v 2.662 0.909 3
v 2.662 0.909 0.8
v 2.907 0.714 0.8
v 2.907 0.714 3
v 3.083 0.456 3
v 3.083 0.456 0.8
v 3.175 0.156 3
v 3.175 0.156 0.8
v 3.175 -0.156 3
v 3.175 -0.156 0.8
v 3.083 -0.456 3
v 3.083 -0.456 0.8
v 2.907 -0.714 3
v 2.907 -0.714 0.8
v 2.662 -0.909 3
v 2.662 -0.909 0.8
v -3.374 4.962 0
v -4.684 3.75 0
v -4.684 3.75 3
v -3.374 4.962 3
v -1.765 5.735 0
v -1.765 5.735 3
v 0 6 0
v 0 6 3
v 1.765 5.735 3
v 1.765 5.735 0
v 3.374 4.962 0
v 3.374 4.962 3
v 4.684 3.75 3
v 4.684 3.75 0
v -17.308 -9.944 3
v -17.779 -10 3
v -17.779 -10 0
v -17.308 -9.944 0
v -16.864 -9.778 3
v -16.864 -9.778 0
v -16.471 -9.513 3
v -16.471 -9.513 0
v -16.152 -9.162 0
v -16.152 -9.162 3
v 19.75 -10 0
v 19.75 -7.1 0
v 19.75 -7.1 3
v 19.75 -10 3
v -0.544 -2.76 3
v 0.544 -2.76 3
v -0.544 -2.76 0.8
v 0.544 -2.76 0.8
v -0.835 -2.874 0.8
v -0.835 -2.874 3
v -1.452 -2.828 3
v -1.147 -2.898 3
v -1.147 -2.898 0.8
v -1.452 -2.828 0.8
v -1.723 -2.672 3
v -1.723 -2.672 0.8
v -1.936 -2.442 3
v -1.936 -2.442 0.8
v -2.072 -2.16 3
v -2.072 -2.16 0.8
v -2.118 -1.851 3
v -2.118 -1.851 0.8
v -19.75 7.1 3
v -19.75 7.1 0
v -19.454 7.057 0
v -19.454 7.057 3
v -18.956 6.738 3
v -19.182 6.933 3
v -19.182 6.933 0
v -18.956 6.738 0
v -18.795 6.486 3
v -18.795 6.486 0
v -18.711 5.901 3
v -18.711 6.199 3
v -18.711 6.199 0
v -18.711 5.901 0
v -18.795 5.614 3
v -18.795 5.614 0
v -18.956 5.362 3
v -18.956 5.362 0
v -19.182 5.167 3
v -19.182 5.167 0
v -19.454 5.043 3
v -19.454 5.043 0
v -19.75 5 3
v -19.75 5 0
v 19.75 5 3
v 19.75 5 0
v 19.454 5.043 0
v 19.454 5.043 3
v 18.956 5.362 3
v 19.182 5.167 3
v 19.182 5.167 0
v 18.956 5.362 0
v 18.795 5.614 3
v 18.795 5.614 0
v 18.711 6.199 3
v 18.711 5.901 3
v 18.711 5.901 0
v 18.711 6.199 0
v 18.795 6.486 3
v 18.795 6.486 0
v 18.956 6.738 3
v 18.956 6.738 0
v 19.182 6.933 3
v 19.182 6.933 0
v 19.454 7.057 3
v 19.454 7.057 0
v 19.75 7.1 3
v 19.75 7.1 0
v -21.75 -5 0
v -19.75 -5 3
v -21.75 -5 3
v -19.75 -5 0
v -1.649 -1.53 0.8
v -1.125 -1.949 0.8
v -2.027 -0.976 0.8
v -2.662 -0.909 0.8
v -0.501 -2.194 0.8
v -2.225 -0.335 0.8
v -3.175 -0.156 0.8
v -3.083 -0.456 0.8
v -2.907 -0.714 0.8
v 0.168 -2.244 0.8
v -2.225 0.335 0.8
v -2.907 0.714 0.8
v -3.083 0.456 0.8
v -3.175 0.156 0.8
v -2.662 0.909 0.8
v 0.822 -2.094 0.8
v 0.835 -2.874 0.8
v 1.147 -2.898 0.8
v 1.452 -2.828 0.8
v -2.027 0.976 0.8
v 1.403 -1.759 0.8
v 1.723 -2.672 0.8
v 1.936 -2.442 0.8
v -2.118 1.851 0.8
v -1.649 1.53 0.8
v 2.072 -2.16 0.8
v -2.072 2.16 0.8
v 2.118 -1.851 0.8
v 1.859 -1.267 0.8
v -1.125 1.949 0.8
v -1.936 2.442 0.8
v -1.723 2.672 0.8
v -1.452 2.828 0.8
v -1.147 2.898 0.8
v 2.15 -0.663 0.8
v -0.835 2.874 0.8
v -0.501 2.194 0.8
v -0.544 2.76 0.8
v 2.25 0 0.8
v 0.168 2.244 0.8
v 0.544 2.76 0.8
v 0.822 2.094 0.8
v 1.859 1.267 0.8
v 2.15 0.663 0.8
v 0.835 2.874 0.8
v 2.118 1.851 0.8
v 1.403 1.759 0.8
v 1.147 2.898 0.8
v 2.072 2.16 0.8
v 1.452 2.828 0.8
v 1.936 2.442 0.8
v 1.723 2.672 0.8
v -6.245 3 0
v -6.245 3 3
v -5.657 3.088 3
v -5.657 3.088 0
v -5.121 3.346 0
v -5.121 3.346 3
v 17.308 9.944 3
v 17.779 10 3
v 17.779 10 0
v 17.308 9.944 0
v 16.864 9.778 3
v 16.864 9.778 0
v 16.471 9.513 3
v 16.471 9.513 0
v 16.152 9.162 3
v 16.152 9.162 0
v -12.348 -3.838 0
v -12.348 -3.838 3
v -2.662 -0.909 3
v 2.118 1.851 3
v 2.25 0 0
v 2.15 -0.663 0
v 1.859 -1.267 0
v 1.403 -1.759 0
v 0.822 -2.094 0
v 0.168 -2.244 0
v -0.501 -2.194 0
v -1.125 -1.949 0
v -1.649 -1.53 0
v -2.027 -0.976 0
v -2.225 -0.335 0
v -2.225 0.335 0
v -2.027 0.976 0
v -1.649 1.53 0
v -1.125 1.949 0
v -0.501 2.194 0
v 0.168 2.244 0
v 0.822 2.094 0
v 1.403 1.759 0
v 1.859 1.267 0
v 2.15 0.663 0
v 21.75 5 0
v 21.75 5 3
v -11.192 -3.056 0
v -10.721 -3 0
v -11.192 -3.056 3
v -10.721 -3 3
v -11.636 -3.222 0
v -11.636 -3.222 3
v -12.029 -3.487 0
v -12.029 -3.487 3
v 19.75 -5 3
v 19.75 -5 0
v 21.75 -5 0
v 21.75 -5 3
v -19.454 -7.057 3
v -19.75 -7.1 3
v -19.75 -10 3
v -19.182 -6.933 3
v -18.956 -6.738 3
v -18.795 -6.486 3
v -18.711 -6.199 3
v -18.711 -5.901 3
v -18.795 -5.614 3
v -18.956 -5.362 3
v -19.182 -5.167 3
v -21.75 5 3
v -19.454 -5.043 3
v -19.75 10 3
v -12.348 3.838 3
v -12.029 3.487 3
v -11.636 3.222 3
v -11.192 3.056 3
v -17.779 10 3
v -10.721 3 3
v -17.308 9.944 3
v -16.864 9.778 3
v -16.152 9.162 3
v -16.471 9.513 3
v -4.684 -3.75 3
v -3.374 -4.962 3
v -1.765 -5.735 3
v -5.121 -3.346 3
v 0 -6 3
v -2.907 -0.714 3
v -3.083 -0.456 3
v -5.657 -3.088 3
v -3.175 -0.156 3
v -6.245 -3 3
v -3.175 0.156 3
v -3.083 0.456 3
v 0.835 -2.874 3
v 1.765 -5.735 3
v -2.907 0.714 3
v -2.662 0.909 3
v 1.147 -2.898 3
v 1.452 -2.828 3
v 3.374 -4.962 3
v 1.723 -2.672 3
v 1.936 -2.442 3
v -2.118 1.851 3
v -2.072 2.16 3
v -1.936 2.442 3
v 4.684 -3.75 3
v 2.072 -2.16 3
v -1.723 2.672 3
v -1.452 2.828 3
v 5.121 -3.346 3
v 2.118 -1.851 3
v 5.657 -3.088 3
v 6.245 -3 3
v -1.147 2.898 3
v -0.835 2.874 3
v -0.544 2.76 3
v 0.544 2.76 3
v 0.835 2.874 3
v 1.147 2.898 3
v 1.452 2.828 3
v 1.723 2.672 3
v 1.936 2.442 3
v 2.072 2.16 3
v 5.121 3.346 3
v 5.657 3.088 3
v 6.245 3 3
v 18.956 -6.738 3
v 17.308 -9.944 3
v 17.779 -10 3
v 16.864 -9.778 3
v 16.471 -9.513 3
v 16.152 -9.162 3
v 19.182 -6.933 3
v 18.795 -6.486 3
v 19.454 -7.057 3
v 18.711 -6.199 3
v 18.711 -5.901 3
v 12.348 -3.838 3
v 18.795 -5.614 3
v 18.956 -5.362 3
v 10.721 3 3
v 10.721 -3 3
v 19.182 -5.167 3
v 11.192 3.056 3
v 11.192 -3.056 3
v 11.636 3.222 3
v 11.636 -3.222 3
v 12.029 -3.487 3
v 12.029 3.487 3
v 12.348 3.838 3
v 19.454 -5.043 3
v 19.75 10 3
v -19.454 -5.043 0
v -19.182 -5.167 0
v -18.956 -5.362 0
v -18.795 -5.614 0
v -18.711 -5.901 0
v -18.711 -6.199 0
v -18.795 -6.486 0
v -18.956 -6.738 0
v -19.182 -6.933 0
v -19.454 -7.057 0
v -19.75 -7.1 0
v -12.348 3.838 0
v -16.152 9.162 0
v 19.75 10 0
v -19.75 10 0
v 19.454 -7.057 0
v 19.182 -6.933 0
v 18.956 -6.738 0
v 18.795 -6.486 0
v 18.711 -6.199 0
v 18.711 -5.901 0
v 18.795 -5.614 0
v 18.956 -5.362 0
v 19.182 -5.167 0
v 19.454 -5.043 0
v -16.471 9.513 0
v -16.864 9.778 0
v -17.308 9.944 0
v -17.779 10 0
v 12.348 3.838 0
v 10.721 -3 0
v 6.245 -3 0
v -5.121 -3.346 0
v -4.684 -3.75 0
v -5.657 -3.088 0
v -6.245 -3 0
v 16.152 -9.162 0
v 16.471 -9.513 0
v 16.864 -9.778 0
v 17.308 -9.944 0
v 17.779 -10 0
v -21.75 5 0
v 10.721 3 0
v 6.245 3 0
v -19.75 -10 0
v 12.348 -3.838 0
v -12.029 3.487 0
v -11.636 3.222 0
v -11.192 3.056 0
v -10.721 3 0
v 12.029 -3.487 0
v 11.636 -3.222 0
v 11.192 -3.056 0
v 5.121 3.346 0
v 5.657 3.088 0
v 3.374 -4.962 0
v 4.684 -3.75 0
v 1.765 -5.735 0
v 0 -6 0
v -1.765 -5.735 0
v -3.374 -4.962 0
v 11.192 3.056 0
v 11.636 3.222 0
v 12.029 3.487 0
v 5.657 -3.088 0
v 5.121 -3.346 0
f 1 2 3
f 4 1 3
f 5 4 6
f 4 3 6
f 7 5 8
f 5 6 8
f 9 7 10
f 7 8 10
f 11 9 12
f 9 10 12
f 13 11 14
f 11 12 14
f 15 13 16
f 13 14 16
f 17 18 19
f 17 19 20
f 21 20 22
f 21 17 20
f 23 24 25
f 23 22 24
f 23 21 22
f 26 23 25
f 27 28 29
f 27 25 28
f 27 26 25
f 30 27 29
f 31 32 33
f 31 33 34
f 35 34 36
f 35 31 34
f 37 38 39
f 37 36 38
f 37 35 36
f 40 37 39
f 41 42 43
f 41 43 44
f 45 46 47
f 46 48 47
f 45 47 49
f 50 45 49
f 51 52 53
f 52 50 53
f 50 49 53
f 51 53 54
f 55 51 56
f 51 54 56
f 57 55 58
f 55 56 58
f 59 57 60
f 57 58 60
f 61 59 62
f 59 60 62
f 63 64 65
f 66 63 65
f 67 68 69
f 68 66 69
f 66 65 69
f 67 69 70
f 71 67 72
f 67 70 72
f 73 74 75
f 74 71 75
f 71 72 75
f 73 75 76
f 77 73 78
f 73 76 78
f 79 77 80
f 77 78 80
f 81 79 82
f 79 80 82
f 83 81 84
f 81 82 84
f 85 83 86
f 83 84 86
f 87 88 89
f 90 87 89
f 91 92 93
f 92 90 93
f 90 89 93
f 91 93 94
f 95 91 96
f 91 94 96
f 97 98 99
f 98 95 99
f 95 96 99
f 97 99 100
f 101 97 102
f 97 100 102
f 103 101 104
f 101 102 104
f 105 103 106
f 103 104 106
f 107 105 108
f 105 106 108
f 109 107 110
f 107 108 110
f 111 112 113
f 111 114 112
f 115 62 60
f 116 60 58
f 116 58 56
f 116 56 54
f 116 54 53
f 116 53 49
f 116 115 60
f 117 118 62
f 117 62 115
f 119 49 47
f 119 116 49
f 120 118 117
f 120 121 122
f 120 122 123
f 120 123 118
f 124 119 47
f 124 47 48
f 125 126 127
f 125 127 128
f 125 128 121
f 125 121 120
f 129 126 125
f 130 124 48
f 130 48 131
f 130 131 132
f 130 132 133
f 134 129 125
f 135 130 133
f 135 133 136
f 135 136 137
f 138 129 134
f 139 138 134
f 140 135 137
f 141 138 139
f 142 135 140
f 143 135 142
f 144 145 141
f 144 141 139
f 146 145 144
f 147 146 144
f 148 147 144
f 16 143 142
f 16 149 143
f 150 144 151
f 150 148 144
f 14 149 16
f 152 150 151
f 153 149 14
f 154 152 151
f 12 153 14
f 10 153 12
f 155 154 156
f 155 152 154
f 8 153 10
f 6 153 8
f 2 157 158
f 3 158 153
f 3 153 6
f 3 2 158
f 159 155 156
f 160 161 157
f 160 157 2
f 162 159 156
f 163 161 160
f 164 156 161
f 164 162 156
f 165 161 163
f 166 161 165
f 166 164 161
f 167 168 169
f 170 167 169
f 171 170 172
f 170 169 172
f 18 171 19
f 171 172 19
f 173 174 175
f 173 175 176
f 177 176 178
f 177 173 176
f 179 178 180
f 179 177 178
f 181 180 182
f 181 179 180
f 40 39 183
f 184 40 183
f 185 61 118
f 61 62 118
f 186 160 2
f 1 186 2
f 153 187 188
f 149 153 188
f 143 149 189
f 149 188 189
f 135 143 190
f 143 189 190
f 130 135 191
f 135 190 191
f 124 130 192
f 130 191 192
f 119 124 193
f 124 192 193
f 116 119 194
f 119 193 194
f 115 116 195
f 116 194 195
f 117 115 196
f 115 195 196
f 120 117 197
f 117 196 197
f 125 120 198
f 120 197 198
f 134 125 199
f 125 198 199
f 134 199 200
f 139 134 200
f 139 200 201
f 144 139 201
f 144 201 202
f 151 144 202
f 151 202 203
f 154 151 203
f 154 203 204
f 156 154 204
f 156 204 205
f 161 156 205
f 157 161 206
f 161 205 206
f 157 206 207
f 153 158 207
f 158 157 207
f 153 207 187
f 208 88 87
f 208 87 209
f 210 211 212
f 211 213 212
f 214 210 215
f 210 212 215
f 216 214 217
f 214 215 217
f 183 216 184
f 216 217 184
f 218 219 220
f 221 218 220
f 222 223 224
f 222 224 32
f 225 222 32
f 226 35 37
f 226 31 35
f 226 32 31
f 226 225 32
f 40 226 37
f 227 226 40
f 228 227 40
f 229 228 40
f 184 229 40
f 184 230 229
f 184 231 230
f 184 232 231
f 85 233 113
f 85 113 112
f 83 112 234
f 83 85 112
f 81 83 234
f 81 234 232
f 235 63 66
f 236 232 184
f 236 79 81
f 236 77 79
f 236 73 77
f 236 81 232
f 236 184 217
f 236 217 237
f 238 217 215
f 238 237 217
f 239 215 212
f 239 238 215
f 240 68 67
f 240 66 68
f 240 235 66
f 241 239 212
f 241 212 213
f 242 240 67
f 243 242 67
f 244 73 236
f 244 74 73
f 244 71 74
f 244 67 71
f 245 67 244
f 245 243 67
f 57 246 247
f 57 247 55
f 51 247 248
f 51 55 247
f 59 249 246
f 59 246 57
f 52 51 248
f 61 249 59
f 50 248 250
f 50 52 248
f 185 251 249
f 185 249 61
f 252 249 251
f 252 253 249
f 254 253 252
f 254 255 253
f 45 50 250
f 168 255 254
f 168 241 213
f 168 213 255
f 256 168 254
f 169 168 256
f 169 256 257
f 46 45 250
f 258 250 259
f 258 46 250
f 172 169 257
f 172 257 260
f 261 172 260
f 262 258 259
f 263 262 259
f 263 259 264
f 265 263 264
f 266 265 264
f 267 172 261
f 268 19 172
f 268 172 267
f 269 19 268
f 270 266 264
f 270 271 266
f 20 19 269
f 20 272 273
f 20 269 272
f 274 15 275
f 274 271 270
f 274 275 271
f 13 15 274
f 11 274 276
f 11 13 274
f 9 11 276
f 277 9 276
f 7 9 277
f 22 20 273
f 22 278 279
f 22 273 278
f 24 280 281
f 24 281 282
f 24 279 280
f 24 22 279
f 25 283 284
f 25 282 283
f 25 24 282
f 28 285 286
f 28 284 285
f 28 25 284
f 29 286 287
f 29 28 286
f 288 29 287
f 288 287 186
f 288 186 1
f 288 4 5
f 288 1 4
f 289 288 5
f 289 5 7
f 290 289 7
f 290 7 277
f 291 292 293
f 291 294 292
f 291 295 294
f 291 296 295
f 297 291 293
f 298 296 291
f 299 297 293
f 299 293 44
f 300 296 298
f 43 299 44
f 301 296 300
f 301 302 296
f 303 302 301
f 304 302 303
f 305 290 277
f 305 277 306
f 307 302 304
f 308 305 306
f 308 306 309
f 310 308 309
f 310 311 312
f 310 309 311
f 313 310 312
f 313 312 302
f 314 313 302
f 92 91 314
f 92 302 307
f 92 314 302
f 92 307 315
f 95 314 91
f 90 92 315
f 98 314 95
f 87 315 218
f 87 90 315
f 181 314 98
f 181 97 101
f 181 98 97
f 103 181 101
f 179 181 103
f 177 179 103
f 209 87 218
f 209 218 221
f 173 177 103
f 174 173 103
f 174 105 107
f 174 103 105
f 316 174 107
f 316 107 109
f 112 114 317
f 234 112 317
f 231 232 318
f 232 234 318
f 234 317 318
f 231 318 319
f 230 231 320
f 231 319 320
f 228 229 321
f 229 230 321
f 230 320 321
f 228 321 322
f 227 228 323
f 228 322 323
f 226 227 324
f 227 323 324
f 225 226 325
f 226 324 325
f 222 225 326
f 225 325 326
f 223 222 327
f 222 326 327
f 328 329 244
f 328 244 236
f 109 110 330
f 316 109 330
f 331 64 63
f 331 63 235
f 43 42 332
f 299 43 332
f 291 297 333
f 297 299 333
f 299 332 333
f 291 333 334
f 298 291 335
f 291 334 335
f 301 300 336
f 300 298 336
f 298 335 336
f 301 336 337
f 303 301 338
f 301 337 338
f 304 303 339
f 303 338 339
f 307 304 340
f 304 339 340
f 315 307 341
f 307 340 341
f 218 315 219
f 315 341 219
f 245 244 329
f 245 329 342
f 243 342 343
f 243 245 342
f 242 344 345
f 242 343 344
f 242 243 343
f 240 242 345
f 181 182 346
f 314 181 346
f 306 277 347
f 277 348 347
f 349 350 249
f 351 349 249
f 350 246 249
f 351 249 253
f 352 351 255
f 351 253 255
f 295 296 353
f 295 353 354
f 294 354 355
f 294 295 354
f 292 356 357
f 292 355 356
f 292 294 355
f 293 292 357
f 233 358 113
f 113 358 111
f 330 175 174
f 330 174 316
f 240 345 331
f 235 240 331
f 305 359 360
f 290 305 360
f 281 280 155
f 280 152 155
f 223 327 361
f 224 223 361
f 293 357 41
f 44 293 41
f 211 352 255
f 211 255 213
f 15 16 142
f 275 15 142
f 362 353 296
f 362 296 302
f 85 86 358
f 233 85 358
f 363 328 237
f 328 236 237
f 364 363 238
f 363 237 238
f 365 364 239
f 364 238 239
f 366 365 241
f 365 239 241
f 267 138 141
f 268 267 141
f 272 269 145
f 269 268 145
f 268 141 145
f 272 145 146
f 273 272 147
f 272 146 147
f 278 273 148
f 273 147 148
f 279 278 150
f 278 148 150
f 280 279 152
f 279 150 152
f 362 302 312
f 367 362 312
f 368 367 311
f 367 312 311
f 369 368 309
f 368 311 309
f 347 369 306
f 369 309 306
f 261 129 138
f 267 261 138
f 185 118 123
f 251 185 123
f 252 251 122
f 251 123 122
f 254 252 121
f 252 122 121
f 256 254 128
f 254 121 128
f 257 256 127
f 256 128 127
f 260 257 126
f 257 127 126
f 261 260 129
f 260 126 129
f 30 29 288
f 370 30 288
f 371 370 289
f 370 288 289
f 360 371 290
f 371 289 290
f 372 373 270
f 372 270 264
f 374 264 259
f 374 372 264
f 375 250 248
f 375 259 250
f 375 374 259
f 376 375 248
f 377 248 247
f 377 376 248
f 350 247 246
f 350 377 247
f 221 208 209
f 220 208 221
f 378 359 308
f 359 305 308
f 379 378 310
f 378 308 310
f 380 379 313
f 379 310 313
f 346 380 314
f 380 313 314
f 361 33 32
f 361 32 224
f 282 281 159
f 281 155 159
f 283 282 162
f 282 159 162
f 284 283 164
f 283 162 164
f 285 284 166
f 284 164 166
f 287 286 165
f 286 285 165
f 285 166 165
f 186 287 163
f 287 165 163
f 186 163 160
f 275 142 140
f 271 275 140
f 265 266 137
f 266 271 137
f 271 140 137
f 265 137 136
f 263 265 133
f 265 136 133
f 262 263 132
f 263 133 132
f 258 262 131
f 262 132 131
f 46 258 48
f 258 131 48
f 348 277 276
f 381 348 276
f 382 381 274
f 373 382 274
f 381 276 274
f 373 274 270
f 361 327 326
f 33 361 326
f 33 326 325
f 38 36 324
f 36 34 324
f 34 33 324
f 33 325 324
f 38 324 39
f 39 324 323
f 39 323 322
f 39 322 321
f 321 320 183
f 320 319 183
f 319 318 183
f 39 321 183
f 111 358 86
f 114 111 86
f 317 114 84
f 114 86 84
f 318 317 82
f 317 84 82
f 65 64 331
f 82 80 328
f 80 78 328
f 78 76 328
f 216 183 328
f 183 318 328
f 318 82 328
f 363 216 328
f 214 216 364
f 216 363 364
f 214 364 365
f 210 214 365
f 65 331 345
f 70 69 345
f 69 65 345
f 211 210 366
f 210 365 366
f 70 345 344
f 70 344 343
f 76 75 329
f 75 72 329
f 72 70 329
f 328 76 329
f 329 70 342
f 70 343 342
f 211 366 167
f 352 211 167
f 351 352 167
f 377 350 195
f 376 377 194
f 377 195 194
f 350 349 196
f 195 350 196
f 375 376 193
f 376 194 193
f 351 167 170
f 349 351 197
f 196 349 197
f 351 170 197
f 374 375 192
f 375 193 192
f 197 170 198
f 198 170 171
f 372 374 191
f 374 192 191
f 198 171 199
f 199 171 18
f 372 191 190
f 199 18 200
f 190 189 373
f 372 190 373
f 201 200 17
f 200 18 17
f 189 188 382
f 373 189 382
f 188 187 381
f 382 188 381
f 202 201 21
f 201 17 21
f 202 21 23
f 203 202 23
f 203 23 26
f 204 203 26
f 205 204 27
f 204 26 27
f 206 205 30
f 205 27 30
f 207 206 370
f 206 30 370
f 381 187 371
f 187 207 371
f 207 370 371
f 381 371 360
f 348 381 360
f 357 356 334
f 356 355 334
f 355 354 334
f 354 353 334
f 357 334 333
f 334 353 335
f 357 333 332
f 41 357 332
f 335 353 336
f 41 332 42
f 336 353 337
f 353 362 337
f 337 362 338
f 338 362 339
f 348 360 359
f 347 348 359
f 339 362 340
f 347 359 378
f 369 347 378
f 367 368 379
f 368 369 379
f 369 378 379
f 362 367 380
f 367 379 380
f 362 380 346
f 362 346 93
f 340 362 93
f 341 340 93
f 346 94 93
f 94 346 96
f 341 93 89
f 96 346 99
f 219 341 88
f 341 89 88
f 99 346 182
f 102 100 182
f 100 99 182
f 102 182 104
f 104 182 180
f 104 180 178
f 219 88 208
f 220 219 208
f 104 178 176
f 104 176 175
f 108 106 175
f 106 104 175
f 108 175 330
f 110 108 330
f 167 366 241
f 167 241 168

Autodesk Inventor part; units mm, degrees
ref_plane "YZ Plane" through (0, 0, 0) normal (1, 0, 0) x (0, 1, 0)
ref_plane "XZ Plane" through (0, 0, 0) normal (0, 1, 0) x (-1, 0, 0)
ref_plane "XY Plane" through (0, 0, 0) normal (0, 0, 1) x (1, 0, 0)
sketch "スケッチ1" plane through (0, 0, 0) normal (0, 0, 1) x (1, 0, 0)
  line L0 (-19.75, 10) -> (19.75, 10) construction
  line L1 (19.75, 10) -> (19.75, -10) construction
  line L2 (19.75, -10) -> (-19.75, -10) construction
  line L3 (-19.75, -10) -> (-19.75, 10) construction
  line L4 (-19.75, 10) -> (19.75, -10) construction
  line L5 (19.75, 10) -> (-19.75, -10) construction
  line L6 (-19.75, 5) -> (-21.75, 5)
  line L7 (-21.75, 5) -> (-21.75, -5)
  line L8 (-19.75, 0) -> (19.75, 0) construction
  line L9 (0, 10) -> (0, -10) construction
  circle A0 centre (0, 0) radius 2.25
  arc A1 (-19.75, 5) -> (-19.75, 7.1) centre (-19.75, 6.05) ccw
  line L10 (-16.75, 10) -> (-11.75, 3)
  line L11 (-19.75, -5) -> (-21.75, -5)
  arc A2 (-19.75, -7.1) -> (-19.75, -5) centre (-19.75, -6.05) ccw
  line L12 (-16.75, -10) -> (-11.75, -3)
  line L13 (-19.75, 7.1) -> (-19.75, 10)
  line L14 (-16.75, 10) -> (-19.75, 10)
  line L15 (-16.75, -10) -> (-19.75, -10)
  line L16 (-19.75, -7.1) -> (-19.75, -10)
  line L17 (19.75, 5) -> (21.75, 5)
  line L18 (21.75, 5) -> (21.75, -5)
  arc A3 (19.75, 7.1) -> (19.75, 5) centre (19.75, 6.05) ccw
  line L19 (16.75, 10) -> (11.75, 3)
  line L20 (19.75, -5) -> (21.75, -5)
  arc A4 (19.75, -5) -> (19.75, -7.1) centre (19.75, -6.05) ccw
  line L21 (16.75, -10) -> (11.75, -3)
  line L22 (19.75, 7.1) -> (19.75, 10)
  line L23 (16.75, 10) -> (19.75, 10)
  line L24 (16.75, -10) -> (19.75, -10)
  line L25 (19.75, -7.1) -> (19.75, -10)
  arc A5 (5.1962, 3) -> (-5.1962, 3) centre (0, 0) ccw
  arc A6 (-5.1962, -3) -> (5.1962, -3) centre (0, 0) ccw
  line L26 (-1.5935, -2.76) -> (-2.1185, -1.8507) construction
  line L27 (-3.187, 0) -> (-2.662, 0.9093) construction
  line L28 (-1.5935, 2.76) -> (-0.5435, 2.76) construction
  line L29 (1.5935, 2.76) -> (2.1185, 1.8507) construction
  line L30 (3.187, 0) -> (2.662, -0.9093) construction
  line L31 (1.5935, -2.76) -> (0.5435, -2.76) construction
  arc A7 (-2.662, 0.9093) -> (-2.662, -0.9093) centre (-2.137, 0) ccw
  arc A8 (-2.1185, -1.8507) -> (-0.5435, -2.76) centre (-1.0685, -1.8507) ccw
  arc A9 (0.5435, -2.76) -> (2.1185, -1.8507) centre (1.0685, -1.8507) ccw
  arc A10 (2.662, -0.9093) -> (2.662, 0.9093) centre (2.137, 0) ccw
  arc A11 (2.1185, 1.8507) -> (0.5435, 2.76) centre (1.0685, 1.8507) ccw
  arc A12 (-0.5435, 2.76) -> (-2.1185, 1.8507) centre (-1.0685, 1.8507) ccw
  line L32 (-2.1185, 1.8507) -> (-1.5935, 2.76) construction
  line L33 (-2.662, 0.9093) -> (-2.1185, 1.8507)
  line L34 (-2.662, -0.9093) -> (-3.187, 0) construction
  line L35 (-2.1185, -1.8507) -> (-2.662, -0.9093)
  line L36 (-0.5435, -2.76) -> (-1.5935, -2.76) construction
  line L37 (0.5435, -2.76) -> (-0.5435, -2.76)
  line L38 (2.1185, -1.8507) -> (1.5935, -2.76) construction
  line L39 (2.662, -0.9093) -> (2.1185, -1.8507)
  line L40 (2.662, 0.9093) -> (3.187, 0) construction
  line L41 (2.1185, 1.8507) -> (2.662, 0.9093)
  line L42 (0.5435, 2.76) -> (1.5935, 2.76) construction
  line L43 (-0.5435, 2.76) -> (0.5435, 2.76)
  line L44 (-11.75, 3) -> (-5.1962, 3)
  line L45 (-5.1962, -3) -> (-11.75, -3)
  line L46 (5.1962, -3) -> (11.75, -3)
  line L47 (11.75, 3) -> (5.1962, 3)
  point P0 (0, 0)
  point P1 (-1.5935, -2.76)
  point P2 (1.5935, -2.76)
  point P3 (3.187, 0)
  point P4 (1.5935, 2.76)
  point P5 (-1.5935, 2.76)
  dimension "d0" = 39.5
  dimension "d3" = 4.5
  dimension "d4" = 2
  dimension "d5" = 10
  dimension "d6" = 1.05
  dimension "d7" = 3
  dimension "d9" = 5
  dimension "d11" = 8
  dimension "d12" = 6
  dimension "d14" = 1.05
  dimension "d17" = 360
  dimension "d19" = 5.52
  dimension "d20" = 6
extrude "押し出し1" add sketch "スケッチ1" along normal blind 3 contours A1 L13 L14 L10 L44 A5 L47 L19 L23 L22 A3 L17 L18 L20 A4 L25 L24 L21 L46 A6 L45 L12 L15 L16 A2 L11 L7 L6
extrude "押し出し2" add sketch "スケッチ1" along normal blind 0.8 contours L33 A12 L43 A11 L41 A10 L39 A9 L37 A8 L35 A7
fillet "フィレット1" radius 2 12 edges at (-11.75, 3, 1.5) (-11.75, -3, 1.5) (-16.75, 10, 1.5) (-16.75, -10, 1.5) (-5.1962, -3, 1.5) (-5.1962, 3, 1.5) (5.1962, 3, 1.5) (5.1962, -3, 1.5) (11.75, 3, 1.5) (11.75, -3, 1.5) (16.75, 10, 1.5) (16.75, -10, 1.5)
properties part number "Ankle_front_frame" material "アルミニウム 2014-T4"
